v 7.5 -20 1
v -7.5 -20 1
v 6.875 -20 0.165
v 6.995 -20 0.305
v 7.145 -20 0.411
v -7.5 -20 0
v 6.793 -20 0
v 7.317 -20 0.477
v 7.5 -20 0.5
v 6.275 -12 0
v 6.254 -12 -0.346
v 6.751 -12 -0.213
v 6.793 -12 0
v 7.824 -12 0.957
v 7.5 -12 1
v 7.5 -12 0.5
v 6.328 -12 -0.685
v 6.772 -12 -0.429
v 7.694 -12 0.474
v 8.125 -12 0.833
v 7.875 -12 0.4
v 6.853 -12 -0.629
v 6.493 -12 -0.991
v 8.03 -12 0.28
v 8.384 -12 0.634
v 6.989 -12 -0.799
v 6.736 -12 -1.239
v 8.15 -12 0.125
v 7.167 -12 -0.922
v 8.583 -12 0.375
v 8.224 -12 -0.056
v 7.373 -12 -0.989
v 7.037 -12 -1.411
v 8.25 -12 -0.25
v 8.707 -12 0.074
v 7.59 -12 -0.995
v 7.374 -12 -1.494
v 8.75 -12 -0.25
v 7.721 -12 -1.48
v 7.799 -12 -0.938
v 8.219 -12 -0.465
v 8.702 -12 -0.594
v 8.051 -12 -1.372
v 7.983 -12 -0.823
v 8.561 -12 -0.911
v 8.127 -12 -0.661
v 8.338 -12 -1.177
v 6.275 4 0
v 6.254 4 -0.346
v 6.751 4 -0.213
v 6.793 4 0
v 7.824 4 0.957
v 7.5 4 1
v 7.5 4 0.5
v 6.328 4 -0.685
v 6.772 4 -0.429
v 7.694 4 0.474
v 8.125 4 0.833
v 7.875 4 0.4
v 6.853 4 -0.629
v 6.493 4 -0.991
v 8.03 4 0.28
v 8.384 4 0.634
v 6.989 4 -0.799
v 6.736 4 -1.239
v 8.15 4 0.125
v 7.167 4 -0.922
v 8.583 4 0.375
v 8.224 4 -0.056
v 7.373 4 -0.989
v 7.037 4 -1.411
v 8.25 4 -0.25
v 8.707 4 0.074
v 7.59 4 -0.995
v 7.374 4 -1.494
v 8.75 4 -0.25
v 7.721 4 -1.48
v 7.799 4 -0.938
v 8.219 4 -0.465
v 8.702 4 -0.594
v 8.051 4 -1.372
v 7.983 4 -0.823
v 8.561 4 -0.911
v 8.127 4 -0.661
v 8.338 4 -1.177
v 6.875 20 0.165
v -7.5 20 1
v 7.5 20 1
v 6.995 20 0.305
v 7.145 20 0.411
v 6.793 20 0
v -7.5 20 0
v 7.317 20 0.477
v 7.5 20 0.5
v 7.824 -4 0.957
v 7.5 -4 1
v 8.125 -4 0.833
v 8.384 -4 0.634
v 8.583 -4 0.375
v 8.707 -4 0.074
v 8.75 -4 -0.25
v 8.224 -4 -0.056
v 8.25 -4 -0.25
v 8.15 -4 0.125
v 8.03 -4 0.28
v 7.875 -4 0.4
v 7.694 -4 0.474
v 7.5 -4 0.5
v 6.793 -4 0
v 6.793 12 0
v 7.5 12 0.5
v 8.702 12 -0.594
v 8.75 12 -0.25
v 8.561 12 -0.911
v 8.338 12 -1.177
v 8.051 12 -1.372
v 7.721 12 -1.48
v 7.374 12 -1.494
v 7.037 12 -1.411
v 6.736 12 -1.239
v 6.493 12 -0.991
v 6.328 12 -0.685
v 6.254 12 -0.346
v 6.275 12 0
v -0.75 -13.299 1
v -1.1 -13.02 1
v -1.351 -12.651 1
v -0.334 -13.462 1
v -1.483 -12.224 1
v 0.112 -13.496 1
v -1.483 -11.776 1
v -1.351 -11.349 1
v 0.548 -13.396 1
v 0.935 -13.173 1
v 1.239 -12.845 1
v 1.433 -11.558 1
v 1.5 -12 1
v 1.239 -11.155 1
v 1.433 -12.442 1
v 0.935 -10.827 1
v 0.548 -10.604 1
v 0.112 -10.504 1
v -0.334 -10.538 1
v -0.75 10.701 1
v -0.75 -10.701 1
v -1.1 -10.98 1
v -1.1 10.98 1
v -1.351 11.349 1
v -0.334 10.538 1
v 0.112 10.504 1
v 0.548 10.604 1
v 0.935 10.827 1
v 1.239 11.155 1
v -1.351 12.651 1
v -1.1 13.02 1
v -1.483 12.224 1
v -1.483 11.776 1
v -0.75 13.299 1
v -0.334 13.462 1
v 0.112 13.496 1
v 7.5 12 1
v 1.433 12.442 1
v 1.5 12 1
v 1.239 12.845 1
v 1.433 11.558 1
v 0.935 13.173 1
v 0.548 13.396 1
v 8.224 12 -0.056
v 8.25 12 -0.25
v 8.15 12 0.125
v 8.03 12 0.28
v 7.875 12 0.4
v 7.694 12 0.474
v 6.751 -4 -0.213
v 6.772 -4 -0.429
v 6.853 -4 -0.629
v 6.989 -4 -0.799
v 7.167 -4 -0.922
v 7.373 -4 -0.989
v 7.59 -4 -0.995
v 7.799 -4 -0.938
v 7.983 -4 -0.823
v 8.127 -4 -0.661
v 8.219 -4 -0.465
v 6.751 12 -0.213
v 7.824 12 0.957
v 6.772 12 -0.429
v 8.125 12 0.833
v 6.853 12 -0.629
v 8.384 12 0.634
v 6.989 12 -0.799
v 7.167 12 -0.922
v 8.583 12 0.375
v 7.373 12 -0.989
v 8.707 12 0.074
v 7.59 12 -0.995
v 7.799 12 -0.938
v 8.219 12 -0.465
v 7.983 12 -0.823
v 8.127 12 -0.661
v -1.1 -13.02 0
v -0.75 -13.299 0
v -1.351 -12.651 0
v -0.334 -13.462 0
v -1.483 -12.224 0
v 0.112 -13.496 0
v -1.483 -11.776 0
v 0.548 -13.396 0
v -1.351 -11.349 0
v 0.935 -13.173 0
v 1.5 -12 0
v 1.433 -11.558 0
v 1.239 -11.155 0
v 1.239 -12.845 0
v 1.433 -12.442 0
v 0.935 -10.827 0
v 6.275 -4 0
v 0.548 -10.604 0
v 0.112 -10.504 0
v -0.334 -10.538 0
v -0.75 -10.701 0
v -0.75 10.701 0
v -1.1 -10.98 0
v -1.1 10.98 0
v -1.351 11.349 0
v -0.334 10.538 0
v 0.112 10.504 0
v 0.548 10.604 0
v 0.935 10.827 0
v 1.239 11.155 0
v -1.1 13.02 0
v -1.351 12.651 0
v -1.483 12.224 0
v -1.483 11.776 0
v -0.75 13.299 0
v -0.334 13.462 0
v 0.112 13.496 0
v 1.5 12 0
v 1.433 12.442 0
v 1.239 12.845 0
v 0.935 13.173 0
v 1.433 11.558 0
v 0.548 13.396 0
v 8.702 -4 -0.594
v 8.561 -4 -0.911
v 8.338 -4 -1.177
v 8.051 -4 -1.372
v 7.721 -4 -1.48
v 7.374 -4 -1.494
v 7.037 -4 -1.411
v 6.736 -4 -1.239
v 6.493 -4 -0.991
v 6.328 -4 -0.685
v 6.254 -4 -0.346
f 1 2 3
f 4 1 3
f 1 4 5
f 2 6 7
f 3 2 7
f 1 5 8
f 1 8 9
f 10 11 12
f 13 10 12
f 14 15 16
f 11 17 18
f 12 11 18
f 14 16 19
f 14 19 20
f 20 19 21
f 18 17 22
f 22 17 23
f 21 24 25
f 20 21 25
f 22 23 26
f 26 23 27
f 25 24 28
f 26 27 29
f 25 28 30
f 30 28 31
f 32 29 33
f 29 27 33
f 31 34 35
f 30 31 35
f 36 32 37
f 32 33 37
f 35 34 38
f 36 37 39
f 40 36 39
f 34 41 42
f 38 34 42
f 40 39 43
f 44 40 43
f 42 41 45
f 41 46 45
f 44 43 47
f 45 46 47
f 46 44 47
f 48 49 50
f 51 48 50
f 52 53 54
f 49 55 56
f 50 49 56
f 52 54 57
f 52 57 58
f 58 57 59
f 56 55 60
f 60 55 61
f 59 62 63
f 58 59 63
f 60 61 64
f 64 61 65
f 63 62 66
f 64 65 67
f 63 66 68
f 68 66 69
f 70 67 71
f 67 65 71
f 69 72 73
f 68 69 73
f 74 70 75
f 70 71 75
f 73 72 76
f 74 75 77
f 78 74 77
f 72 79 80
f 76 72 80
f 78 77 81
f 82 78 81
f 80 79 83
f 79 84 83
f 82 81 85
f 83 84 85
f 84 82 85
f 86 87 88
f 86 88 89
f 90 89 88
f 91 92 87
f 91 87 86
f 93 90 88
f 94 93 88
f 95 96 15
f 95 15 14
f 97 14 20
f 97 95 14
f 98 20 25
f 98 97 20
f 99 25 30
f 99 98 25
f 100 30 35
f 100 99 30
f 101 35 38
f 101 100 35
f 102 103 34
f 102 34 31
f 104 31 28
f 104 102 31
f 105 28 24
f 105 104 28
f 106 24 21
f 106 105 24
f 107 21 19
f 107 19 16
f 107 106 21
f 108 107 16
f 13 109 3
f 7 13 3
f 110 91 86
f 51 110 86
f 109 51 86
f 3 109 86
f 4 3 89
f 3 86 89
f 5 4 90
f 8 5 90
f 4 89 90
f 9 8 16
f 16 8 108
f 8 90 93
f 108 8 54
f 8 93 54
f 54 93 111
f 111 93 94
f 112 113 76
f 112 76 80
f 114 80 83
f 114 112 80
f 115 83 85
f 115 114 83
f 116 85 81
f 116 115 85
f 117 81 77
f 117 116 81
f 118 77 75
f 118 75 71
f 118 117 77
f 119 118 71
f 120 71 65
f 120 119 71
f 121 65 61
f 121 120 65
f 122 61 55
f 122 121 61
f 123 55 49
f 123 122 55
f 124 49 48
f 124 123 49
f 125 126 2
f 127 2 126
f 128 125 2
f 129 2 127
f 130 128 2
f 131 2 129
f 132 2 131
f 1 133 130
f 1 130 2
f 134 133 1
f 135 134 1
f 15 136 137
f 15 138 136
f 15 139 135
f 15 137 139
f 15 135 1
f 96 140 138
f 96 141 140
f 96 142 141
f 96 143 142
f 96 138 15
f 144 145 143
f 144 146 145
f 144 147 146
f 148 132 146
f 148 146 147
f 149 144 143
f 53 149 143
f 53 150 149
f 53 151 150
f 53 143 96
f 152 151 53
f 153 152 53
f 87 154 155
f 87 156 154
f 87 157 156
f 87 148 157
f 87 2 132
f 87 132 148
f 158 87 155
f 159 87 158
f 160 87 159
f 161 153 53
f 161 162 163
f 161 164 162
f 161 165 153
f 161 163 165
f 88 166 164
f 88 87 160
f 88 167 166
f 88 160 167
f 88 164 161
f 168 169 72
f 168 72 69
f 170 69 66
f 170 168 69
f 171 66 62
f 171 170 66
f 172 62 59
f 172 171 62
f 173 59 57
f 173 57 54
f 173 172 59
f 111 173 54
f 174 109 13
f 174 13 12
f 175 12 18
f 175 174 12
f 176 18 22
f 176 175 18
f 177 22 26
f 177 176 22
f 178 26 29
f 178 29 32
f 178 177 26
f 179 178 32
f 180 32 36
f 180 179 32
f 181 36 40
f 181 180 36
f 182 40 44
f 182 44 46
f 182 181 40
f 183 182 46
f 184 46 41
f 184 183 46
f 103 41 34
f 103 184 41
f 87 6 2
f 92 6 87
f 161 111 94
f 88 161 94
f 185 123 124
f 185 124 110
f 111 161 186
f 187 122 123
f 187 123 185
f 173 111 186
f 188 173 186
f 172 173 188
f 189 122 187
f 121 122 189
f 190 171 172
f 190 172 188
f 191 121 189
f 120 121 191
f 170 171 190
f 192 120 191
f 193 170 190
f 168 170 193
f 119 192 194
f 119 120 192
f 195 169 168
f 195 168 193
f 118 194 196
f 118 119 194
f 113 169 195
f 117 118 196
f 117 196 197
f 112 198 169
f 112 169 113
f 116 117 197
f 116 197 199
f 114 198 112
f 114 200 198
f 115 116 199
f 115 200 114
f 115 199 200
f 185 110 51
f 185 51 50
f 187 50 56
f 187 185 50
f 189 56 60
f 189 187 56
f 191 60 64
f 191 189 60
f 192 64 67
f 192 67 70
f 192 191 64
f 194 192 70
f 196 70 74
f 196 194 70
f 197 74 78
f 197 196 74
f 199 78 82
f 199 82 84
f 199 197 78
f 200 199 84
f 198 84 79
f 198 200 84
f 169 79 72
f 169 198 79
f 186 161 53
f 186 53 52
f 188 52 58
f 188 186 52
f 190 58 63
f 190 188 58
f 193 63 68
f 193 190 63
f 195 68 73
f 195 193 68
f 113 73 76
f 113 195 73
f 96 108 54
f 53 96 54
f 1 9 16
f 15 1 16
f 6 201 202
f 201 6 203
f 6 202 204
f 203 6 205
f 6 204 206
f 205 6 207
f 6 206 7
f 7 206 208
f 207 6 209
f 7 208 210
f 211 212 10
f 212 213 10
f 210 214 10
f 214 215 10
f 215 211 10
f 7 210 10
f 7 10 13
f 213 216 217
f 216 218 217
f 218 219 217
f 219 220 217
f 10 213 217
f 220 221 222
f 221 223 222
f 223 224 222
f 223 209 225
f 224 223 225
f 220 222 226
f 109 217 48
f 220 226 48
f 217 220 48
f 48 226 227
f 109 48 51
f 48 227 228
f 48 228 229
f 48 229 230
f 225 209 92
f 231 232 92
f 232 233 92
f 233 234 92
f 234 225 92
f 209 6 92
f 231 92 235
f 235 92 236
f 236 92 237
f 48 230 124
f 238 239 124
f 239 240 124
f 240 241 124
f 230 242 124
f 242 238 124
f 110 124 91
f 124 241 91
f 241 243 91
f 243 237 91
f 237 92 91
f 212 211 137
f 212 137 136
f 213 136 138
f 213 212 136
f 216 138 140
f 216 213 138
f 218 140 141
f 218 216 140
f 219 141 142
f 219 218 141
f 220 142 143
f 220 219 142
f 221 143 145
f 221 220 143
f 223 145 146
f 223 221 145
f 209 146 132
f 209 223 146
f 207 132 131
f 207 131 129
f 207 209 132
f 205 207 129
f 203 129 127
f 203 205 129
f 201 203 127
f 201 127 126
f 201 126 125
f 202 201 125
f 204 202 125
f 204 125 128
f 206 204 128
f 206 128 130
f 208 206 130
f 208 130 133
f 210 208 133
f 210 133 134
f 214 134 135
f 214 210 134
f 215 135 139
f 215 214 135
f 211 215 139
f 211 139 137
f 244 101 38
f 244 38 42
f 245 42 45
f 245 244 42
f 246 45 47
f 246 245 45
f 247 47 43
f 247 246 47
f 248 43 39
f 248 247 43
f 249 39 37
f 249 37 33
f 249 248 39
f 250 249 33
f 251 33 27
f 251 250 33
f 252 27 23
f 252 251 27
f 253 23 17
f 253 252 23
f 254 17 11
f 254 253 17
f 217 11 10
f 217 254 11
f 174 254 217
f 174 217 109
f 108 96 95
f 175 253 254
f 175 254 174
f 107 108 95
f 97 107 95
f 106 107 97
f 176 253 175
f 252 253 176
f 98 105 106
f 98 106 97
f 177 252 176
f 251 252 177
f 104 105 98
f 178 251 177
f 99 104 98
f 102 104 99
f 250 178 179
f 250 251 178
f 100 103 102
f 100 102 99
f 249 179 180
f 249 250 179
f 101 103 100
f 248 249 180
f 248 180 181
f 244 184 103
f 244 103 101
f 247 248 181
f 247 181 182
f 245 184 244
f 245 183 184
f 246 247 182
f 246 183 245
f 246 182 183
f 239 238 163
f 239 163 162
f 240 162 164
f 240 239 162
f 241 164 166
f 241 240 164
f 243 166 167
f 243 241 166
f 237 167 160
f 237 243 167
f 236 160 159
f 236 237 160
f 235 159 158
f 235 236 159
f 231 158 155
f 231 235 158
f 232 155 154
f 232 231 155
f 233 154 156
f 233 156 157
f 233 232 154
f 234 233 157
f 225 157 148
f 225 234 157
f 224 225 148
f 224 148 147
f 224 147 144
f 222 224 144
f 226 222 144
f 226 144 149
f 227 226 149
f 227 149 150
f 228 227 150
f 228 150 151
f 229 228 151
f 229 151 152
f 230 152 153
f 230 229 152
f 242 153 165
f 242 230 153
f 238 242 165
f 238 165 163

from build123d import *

# Parameters (mm, degrees)
SKETCH1_W           = 15
SKETCH1_H           = 40
SKETCH1_R           = 1.5
BOSS_EXTRUDE2_DEPTH = 1
BOSS_EXTRUDE5_START = -8
BOSS_EXTRUDE5_DEPTH = 8
LPATTERN2_COUNT     = 2
LPATTERN2_PITCH     = 16
SKETCH6_R           = 0.75
CUT_EXTRUDE3_DEPTH  = 40


with BuildPart() as part:
    # Sketch1 → Boss-Extrude2 (new body)
    with BuildSketch(Plane.XY):
        Rectangle(SKETCH1_W, SKETCH1_H)
        with Locations((0, 12)):
            Circle(SKETCH1_R, mode=Mode.SUBTRACT)
        with Locations((0, -12)):
            Circle(SKETCH1_R, mode=Mode.SUBTRACT)
    extrude(amount=BOSS_EXTRUDE2_DEPTH)

    # Sketch5 → Boss-Extrude5 (add)
    with BuildSketch(Plane(origin=(0, 20, 0), x_dir=(1, 0, 0), z_dir=(0, 1, 0)).offset(BOSS_EXTRUDE5_START)):
        with BuildLine():
            Line((7.5, -0.5), (7.5, -1))
            ThreePointArc((7.5, -1), (8.383883476, -0.633883476), (8.75, 0.25))
            ThreePointArc((8.75, 0.25), (7.374363797, 1.493670191), (6.275255129, 0))
            Line((6.275255129, 0), (6.792893219, 0))
            ThreePointArc((6.792893219, 0), (7.373173516, 0.98919892), (8.25, 0.25))
            ThreePointArc((8.25, 0.25), (8.030330086, -0.280330086), (7.5, -0.5))
        make_face()
        with BuildLine():
            ThreePointArc((6.275255129, 0), (6.709430585, -0.718245837), (7.5, -1))
            Line((7.5, -1), (7.5, -0.5))
            ThreePointArc((7.5, -0.5), (7.066987298, -0.362372436), (6.792893219, 0))
            Line((6.792893219, 0), (6.275255129, 0))
        make_face()
    boss_extrude5 = extrude(amount=-BOSS_EXTRUDE5_DEPTH)

    # LPattern2: Boss-Extrude5 ×2
    with Locations(*[(0, -i * LPATTERN2_PITCH, 0) for i in range(1, LPATTERN2_COUNT)]):
        add(boss_extrude5)

    # Sketch6 → Cut-Extrude3 (cut)
    with BuildSketch(Plane(origin=(0, 20, 0), x_dir=(1, 0, 0), z_dir=(0, 1, 0))):
        with Locations((7.5, 0.25)):
            Circle(SKETCH6_R)
    extrude(amount=-CUT_EXTRUDE3_DEPTH, mode=Mode.SUBTRACT)


solid = part.part
